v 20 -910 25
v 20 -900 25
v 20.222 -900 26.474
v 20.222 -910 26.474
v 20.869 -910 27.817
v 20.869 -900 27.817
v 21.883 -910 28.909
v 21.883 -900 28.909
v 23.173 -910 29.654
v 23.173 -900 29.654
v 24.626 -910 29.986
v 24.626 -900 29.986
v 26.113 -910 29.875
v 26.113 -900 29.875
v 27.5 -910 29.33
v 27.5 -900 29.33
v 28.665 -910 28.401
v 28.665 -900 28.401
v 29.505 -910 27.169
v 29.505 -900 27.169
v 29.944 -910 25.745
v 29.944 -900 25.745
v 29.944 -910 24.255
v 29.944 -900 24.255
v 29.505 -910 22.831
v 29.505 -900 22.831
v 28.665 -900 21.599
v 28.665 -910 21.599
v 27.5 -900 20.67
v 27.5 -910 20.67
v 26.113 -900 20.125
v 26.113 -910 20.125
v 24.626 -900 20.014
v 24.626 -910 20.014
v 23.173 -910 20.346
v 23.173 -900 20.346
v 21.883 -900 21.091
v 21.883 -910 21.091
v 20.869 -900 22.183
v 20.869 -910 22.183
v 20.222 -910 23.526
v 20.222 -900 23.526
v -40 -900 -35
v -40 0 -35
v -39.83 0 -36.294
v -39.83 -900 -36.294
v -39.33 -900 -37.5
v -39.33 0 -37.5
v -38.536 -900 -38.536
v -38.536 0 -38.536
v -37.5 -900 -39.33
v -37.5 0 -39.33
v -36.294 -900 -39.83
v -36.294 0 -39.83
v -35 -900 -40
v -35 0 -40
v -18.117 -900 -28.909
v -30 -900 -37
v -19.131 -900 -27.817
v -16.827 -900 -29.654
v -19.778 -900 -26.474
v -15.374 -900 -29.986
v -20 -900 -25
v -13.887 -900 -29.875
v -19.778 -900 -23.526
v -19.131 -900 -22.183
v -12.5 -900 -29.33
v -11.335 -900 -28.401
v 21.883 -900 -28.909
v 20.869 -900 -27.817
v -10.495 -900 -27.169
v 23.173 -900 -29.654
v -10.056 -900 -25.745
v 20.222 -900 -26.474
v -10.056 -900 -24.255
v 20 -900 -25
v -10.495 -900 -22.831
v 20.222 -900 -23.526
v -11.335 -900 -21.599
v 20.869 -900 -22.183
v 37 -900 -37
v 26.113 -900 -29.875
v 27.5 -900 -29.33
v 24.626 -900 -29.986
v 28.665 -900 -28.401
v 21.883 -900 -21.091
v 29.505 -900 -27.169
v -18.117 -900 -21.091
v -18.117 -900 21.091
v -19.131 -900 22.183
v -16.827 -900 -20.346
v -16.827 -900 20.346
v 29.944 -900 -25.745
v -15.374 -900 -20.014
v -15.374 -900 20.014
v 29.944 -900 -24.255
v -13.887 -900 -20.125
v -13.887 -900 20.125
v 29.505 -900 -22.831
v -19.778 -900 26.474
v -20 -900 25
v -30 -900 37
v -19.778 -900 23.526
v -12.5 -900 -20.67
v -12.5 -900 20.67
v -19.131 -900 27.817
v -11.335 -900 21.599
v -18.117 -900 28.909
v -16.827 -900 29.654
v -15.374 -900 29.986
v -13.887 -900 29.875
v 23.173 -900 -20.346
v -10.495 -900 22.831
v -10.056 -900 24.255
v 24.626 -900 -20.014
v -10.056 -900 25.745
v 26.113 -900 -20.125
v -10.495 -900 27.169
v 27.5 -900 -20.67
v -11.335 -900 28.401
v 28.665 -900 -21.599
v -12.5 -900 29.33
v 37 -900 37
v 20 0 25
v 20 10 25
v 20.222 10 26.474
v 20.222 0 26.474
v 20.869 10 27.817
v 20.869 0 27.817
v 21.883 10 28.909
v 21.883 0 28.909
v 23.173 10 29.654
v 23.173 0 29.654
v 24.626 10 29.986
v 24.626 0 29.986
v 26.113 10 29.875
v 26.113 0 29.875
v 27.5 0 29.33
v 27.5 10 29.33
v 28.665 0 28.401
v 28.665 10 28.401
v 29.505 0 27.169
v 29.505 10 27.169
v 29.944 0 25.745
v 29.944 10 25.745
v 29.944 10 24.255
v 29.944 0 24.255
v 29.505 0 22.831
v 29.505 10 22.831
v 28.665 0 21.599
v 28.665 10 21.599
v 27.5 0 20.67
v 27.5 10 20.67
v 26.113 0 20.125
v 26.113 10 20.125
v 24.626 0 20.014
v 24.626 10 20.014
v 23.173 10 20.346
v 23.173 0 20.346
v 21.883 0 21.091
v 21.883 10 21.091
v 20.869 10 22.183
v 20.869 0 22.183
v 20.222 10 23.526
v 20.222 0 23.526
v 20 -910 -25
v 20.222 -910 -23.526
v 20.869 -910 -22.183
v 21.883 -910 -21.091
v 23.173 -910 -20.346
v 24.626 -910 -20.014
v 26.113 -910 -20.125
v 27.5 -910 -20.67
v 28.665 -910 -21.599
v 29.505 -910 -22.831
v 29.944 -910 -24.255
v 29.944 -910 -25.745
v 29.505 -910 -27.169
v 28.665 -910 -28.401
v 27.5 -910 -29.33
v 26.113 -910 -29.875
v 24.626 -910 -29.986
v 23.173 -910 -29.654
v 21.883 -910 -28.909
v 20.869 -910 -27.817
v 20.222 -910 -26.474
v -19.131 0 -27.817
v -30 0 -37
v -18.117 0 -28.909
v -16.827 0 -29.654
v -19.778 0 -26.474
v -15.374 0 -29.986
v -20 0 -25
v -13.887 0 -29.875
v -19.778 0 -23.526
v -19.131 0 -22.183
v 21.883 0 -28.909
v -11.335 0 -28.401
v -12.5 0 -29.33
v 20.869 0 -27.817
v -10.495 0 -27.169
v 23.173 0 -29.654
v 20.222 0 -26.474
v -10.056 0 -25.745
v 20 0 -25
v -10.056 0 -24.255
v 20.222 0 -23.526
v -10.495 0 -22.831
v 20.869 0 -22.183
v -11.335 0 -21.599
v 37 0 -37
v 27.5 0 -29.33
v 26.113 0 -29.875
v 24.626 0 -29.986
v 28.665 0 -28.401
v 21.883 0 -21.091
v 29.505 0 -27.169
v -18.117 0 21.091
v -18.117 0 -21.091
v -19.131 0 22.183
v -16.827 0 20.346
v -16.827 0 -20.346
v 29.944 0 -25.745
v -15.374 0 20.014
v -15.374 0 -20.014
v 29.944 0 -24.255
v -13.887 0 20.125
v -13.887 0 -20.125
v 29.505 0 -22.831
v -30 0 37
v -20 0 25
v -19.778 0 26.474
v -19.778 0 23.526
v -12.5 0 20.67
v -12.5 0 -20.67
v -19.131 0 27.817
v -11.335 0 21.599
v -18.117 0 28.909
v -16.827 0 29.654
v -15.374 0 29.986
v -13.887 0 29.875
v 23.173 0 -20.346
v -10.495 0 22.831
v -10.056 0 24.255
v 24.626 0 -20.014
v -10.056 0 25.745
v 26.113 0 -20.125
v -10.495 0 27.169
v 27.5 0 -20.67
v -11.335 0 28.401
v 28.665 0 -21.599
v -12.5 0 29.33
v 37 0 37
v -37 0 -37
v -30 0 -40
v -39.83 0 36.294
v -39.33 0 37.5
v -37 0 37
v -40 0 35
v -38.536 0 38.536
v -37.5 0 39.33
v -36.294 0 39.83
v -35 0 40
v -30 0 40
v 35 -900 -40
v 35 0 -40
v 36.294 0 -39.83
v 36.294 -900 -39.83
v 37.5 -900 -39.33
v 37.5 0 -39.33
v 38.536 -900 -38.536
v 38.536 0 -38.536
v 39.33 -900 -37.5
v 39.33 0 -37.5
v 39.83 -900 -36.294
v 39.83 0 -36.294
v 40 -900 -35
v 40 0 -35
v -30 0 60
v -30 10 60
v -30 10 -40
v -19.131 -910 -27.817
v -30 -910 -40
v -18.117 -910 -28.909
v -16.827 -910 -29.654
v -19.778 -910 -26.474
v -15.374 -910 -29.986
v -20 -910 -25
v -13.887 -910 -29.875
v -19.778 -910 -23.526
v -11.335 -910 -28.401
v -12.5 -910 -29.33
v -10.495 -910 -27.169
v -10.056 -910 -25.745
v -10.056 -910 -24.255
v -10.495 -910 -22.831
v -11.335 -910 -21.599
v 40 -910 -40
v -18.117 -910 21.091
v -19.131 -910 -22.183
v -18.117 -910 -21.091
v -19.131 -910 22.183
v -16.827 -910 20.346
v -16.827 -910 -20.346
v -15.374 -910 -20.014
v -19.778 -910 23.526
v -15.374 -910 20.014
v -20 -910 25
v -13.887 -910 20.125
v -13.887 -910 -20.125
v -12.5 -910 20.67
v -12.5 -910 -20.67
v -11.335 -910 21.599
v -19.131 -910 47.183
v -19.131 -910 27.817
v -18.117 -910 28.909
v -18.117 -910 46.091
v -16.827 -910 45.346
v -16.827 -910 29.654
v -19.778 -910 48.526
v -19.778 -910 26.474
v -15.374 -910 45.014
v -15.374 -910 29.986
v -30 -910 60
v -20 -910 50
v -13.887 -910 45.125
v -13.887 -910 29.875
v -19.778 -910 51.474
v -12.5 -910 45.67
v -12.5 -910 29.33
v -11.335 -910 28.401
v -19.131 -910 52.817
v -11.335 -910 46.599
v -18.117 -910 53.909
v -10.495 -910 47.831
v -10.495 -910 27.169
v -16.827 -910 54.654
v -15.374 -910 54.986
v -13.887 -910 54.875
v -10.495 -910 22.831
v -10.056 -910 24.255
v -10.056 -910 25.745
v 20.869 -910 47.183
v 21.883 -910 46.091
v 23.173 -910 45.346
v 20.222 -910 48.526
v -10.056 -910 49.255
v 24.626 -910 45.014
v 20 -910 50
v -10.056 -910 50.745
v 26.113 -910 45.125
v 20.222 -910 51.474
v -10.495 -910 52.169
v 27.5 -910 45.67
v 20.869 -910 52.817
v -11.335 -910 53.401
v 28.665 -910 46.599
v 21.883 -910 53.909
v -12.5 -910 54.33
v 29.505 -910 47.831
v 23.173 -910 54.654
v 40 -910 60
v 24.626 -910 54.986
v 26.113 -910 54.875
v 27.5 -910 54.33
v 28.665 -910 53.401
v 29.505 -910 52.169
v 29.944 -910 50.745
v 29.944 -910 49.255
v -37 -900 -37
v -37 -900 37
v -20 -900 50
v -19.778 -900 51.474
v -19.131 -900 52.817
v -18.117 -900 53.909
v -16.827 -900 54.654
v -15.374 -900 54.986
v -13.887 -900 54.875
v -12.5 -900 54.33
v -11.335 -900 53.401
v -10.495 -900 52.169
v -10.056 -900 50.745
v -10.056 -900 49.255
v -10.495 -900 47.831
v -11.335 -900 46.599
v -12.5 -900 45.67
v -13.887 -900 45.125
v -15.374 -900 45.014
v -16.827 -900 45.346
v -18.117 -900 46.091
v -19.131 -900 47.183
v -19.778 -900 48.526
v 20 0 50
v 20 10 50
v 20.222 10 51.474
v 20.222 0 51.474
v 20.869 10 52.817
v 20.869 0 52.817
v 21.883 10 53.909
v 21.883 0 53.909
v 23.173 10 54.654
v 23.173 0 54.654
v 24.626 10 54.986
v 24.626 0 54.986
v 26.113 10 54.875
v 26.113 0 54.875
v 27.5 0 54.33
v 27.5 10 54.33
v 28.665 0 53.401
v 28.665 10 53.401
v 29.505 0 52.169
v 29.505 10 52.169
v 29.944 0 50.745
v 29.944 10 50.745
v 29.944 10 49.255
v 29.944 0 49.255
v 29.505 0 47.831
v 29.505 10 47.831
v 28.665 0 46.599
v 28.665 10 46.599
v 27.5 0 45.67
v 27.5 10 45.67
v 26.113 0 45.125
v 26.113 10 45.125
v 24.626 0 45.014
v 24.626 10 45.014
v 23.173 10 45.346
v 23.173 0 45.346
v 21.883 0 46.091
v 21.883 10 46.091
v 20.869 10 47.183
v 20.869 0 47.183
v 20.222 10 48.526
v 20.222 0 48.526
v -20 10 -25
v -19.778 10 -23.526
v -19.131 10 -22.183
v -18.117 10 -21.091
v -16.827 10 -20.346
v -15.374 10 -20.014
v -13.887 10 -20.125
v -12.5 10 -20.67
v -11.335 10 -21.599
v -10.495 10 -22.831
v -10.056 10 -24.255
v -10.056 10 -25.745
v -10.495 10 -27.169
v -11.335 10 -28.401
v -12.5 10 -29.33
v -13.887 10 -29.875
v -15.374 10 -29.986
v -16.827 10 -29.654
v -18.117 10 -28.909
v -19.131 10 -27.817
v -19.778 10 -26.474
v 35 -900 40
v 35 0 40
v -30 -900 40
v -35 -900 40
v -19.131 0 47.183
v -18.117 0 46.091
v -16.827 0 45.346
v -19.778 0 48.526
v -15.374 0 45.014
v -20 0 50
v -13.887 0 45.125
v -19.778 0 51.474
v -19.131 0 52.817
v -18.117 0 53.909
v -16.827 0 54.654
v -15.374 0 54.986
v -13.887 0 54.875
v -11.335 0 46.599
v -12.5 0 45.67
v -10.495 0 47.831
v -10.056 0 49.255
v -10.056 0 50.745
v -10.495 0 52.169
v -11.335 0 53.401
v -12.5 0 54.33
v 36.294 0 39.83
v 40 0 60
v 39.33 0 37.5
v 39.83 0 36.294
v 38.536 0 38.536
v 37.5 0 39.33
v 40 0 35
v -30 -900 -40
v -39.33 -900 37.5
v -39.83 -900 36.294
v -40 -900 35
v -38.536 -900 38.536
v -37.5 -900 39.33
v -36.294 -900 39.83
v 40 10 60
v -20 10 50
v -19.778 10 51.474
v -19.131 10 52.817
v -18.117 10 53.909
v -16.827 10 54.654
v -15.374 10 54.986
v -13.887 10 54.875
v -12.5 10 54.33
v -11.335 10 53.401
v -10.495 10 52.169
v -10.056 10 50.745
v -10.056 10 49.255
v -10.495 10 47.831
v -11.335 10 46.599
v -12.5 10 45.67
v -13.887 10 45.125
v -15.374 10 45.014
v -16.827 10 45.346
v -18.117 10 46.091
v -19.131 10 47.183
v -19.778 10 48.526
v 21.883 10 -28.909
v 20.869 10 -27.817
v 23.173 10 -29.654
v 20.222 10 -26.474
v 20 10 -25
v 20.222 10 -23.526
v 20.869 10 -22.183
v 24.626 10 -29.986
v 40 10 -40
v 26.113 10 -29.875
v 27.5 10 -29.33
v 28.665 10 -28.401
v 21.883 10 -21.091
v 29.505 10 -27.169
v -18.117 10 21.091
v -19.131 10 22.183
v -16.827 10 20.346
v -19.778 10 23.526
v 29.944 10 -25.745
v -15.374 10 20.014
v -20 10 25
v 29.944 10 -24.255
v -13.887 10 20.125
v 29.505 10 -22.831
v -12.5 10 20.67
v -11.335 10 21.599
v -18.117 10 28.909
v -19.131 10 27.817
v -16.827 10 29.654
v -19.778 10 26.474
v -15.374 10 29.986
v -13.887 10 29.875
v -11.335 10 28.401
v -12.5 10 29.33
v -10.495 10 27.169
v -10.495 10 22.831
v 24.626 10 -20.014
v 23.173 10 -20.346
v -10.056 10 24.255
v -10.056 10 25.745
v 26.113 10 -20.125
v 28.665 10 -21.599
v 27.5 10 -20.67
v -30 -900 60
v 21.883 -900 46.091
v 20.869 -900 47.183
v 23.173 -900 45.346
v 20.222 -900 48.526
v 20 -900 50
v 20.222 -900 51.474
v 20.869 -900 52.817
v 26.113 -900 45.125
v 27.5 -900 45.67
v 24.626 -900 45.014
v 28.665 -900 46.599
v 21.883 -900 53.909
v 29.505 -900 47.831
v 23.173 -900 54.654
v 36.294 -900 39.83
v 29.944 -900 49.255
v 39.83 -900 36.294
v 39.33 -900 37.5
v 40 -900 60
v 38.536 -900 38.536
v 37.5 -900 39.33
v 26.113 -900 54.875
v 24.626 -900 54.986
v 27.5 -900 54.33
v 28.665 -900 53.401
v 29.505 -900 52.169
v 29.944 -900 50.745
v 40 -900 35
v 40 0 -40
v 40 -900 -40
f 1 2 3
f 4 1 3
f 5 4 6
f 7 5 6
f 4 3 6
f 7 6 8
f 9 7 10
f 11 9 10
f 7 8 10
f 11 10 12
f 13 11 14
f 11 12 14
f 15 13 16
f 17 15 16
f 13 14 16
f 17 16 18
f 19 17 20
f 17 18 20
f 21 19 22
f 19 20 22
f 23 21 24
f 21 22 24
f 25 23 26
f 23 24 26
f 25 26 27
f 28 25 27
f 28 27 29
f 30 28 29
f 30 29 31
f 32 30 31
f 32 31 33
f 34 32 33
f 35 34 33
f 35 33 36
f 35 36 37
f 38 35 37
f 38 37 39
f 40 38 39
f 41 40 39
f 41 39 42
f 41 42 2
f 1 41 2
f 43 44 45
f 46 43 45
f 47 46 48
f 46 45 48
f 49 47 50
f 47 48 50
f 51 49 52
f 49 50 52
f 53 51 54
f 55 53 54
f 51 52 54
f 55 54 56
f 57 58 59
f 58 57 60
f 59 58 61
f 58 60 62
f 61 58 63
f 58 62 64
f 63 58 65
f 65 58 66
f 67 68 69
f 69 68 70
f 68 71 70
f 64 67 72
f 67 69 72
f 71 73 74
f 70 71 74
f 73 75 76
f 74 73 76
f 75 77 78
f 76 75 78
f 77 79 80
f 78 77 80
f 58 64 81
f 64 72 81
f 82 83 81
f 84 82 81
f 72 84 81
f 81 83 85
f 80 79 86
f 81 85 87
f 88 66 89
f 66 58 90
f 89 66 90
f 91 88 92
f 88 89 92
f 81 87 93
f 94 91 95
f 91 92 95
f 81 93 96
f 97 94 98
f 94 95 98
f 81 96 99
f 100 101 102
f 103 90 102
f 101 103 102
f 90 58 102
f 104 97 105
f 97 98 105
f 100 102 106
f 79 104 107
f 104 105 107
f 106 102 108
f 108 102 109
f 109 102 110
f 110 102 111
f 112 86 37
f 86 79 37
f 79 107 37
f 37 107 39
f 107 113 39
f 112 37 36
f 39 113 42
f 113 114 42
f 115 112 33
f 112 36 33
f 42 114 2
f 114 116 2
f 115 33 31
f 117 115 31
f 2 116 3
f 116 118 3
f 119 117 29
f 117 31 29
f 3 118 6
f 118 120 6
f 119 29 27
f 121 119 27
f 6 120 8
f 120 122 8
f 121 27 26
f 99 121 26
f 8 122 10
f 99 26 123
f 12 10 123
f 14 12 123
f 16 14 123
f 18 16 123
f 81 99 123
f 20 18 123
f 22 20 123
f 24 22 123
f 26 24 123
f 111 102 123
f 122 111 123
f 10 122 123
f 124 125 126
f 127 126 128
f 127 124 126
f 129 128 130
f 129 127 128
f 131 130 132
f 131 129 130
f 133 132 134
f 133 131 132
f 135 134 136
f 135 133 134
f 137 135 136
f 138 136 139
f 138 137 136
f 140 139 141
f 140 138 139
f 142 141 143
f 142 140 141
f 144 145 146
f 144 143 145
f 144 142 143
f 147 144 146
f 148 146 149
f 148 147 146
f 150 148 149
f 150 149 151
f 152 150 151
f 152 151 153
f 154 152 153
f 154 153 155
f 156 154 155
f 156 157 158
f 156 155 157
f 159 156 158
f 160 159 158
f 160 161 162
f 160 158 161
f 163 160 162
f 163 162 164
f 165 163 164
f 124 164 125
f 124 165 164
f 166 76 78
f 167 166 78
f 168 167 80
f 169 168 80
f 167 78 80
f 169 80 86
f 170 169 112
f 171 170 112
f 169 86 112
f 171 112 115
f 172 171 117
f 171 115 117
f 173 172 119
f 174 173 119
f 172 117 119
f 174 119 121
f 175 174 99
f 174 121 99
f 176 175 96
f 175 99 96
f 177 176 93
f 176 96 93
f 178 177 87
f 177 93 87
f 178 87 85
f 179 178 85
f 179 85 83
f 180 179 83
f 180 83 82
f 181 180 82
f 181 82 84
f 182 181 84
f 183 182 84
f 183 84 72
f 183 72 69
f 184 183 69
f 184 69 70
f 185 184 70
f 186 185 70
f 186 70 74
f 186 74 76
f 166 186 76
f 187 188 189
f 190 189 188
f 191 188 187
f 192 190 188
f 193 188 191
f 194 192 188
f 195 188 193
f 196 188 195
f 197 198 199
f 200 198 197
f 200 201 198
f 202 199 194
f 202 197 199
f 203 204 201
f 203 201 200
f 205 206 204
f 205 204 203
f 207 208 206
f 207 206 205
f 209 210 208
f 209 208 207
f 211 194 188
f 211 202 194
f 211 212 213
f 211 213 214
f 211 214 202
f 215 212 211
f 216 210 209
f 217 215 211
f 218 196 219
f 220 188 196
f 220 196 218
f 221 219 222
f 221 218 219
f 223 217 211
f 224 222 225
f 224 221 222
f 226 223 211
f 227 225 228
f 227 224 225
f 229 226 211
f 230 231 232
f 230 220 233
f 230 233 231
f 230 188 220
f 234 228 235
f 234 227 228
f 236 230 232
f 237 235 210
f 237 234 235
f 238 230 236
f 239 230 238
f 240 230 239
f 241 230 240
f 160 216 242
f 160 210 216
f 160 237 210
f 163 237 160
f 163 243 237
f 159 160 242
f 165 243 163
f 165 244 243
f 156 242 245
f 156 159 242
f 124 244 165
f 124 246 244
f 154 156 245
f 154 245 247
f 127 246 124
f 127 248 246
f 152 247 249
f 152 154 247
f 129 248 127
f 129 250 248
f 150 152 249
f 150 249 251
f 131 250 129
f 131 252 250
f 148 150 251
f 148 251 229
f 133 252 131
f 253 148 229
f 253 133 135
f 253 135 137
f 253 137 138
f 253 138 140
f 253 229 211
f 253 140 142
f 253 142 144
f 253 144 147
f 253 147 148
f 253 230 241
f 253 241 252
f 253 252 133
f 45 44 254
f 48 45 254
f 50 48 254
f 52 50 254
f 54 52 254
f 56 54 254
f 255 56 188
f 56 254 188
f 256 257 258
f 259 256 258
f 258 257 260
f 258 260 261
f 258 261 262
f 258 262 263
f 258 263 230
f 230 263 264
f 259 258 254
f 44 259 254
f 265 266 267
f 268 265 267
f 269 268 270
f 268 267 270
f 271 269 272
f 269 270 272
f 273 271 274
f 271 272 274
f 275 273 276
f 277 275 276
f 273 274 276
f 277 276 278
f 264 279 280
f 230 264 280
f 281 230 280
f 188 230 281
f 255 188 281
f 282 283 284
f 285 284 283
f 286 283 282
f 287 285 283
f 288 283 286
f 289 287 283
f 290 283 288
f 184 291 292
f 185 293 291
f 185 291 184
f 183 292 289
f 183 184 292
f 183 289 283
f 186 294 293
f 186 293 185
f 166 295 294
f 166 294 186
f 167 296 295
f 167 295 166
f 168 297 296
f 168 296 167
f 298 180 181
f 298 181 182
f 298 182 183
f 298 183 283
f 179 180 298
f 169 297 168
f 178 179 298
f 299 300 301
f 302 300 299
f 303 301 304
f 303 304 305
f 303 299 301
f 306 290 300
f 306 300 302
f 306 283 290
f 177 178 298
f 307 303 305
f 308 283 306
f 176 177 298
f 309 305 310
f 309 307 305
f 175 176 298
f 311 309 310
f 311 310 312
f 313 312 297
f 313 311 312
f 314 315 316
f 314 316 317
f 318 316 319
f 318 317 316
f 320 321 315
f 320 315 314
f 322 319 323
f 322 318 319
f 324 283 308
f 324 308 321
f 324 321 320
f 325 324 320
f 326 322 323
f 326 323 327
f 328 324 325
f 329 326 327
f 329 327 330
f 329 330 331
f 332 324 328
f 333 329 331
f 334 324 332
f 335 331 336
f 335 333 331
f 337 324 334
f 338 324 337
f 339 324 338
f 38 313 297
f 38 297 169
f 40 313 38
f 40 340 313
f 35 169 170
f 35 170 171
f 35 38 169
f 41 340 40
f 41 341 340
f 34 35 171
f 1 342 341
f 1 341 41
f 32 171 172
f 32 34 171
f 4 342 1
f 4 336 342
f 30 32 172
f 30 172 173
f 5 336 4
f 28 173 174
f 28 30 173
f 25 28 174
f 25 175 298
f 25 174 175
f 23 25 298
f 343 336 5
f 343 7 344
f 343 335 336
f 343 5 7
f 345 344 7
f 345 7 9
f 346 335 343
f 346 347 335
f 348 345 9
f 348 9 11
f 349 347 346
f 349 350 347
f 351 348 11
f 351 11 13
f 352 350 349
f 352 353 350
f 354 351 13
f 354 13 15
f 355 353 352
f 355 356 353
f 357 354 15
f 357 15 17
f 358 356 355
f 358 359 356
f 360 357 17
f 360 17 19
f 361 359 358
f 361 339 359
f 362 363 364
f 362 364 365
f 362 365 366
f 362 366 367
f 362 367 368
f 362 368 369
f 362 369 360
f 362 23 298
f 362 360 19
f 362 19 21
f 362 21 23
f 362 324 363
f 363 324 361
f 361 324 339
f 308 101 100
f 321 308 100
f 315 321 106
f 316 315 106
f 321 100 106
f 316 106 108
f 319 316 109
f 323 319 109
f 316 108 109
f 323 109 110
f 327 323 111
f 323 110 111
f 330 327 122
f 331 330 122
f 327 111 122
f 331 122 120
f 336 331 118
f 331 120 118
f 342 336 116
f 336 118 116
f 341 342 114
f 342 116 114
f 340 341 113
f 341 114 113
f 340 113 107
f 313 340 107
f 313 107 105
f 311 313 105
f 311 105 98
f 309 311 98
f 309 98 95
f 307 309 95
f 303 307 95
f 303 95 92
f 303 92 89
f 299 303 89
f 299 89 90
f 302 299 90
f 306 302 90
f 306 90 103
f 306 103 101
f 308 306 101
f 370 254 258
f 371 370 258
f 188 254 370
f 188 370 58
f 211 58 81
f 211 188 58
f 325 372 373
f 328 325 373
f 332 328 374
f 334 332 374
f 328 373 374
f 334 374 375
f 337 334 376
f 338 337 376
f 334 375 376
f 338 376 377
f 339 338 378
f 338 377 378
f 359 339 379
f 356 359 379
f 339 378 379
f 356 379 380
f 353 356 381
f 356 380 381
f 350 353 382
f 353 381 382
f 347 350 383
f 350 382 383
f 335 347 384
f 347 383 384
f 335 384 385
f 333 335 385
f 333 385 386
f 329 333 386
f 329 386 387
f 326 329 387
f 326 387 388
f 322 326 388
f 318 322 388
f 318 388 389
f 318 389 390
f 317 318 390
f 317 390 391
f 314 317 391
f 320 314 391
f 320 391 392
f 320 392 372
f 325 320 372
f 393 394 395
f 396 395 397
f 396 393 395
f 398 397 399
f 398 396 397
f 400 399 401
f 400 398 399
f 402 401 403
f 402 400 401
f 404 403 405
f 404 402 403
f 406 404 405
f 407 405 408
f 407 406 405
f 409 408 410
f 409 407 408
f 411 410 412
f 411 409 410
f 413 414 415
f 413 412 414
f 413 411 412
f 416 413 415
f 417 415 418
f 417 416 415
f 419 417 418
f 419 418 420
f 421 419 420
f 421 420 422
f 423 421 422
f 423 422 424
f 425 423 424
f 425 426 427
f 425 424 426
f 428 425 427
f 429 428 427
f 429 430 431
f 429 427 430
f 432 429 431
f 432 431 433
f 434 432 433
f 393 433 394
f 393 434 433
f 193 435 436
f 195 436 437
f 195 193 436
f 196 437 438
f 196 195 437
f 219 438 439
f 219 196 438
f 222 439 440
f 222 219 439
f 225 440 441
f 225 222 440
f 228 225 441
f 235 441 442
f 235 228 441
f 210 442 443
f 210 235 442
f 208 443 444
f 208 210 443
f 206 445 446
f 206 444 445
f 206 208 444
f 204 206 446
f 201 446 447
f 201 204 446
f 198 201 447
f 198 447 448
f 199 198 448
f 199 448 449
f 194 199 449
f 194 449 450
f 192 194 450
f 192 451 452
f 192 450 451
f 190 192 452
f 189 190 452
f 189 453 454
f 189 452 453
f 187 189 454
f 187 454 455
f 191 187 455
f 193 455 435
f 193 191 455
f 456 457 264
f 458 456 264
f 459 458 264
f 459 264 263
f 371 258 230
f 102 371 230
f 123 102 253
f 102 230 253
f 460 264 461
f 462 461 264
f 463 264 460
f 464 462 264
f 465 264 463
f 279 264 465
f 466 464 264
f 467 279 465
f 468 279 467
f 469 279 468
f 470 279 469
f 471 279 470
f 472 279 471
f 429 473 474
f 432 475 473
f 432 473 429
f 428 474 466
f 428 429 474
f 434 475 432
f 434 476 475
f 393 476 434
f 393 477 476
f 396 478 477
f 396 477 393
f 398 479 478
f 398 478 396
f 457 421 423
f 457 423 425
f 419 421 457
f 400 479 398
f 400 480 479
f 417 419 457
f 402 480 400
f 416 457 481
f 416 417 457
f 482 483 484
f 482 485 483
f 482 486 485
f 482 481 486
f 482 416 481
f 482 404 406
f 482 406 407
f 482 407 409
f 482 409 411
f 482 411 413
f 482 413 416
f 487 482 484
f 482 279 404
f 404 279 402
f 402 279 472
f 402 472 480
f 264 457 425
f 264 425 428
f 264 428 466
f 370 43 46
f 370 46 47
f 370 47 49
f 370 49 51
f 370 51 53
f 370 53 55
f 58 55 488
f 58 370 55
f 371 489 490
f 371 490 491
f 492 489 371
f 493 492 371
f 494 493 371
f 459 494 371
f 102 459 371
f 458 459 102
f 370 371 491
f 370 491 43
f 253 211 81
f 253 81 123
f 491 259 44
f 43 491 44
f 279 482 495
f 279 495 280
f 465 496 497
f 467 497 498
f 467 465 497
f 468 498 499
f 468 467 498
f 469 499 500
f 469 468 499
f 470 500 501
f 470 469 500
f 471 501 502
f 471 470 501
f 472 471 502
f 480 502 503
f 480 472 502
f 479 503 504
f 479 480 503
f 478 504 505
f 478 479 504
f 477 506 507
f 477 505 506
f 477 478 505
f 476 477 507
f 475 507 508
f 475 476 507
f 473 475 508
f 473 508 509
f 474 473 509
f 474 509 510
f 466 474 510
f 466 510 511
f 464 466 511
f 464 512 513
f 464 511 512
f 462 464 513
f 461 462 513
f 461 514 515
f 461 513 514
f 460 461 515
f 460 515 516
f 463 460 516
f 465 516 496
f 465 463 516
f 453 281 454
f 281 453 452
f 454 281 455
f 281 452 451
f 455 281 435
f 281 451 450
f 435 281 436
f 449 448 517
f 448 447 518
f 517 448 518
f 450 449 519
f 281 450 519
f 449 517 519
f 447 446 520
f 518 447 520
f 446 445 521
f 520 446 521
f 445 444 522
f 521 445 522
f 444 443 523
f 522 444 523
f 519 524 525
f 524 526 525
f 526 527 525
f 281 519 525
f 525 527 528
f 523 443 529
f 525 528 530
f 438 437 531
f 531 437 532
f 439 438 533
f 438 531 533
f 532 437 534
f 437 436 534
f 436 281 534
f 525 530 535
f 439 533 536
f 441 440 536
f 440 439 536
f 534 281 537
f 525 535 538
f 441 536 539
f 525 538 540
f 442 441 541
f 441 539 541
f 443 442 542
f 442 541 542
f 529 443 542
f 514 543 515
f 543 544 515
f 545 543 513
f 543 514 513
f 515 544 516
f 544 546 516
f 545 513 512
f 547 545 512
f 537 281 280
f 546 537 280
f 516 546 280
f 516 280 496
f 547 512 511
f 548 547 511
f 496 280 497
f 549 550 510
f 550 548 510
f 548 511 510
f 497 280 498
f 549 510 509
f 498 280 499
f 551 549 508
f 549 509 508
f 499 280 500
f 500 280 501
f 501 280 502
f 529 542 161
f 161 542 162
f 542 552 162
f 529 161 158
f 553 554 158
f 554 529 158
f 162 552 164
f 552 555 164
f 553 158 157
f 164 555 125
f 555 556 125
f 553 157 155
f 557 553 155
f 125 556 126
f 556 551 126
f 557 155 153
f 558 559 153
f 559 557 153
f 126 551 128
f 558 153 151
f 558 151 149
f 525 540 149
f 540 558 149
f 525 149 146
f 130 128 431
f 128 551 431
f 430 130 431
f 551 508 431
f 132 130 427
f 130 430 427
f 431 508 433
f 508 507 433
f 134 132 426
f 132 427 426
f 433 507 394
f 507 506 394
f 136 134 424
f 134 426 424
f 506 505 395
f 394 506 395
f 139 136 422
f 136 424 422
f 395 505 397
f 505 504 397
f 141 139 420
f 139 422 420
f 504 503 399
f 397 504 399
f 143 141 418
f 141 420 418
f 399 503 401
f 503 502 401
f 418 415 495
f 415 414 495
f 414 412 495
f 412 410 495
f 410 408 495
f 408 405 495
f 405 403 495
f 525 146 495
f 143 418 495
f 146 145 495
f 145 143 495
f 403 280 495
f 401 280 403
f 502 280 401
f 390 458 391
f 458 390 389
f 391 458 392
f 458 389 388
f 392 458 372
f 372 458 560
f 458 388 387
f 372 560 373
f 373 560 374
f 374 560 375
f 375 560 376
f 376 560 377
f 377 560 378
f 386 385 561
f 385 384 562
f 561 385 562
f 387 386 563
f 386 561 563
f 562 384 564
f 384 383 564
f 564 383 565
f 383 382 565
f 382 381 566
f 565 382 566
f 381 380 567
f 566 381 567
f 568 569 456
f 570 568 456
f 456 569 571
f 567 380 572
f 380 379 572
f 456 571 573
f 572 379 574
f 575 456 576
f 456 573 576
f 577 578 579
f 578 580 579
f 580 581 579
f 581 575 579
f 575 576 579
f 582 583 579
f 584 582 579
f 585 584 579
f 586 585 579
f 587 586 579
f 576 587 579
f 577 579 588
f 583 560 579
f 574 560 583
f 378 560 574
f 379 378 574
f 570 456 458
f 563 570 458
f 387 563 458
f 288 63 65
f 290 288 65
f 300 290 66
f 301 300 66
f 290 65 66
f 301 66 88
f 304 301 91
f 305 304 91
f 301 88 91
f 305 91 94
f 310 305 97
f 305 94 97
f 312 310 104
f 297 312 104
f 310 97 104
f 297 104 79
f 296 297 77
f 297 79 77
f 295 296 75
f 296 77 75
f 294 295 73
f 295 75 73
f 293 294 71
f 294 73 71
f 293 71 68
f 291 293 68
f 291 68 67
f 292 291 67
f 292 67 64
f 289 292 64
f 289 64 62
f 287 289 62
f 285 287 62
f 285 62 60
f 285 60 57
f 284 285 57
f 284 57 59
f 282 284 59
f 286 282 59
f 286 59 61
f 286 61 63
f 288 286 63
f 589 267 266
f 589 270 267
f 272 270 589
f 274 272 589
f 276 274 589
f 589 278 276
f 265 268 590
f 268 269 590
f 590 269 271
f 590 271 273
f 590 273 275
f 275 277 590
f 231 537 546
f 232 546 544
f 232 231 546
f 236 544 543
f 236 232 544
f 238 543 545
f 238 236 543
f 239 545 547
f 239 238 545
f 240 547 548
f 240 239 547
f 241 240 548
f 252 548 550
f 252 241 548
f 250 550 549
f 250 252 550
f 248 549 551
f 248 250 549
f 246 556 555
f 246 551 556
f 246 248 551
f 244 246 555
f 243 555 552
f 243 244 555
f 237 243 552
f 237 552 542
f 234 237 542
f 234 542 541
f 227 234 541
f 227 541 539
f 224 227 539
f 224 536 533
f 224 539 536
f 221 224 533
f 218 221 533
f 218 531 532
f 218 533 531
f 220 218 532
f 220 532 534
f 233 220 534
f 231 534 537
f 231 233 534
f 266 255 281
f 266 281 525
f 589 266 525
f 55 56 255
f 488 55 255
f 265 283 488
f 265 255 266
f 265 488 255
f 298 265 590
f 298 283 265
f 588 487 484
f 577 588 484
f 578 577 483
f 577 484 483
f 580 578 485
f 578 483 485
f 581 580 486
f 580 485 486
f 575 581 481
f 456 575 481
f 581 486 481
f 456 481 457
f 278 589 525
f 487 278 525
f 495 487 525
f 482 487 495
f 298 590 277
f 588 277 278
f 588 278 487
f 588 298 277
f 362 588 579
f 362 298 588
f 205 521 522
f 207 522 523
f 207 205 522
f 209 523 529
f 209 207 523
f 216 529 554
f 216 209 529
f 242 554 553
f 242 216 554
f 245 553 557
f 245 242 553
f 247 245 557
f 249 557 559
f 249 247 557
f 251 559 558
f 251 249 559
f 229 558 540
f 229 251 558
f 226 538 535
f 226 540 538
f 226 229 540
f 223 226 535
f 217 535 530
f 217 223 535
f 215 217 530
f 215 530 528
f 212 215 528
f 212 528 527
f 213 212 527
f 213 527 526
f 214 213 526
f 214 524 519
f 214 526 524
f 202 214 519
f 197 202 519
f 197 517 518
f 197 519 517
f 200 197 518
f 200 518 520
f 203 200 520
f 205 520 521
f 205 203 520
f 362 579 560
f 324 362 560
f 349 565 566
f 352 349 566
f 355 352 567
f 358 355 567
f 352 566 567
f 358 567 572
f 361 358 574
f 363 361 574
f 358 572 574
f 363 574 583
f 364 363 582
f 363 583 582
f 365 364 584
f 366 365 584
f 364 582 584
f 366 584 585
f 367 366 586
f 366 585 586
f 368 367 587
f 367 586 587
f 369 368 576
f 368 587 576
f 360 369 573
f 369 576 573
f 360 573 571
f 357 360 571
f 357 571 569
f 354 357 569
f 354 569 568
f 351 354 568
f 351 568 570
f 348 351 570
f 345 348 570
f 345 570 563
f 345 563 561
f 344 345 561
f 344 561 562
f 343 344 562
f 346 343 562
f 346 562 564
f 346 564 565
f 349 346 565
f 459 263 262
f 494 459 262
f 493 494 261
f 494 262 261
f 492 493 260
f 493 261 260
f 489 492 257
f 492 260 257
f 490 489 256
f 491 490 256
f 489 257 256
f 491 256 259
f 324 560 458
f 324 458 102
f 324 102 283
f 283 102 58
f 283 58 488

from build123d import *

# Parameters (mm, degrees)
F0_W     = 74
F0_H     = 74
F1_DEPTH = 900
F2_W     = 67
F2_H     = 74
F3_DEPTH = 10
F4_R     = 5
F5_DEPTH = 25


# Not quite as in the source:
# - a pattern or mirror of a feature is missing from the dataset's text; its kind, count and spacing are read off the source's solid


with BuildPart() as f1:
    # F0 (on Front) → F1 (new body)
    with BuildSketch(Plane.XZ):
        with BuildLine():
            ThreePointArc((40, 35), (38.5355339059, 38.5355339059), (35, 40))
            Line((35, 40), (-35, 40))
            ThreePointArc((-35, 40), (-38.5355339059, 38.5355339059), (-40, 35))
            Line((-40, 35), (-40, -35))
            ThreePointArc((-40, -35), (-38.5355339059, -38.5355339059), (-35, -40))
            Line((-35, -40), (35, -40))
            ThreePointArc((35, -40), (38.5355339059, -38.5355339059), (40, -35))
            Line((40, -35), (40, 35))
        make_face()
        Rectangle(F0_W, F0_H, mode=Mode.SUBTRACT)
    extrude(amount=F1_DEPTH)

    # F2 (on face) → F3 (join)
    with BuildSketch(Plane.XZ.offset(900)):
        with Locations((3.5, 0)):
            Rectangle(F2_W, F2_H)
        with BuildLine():
            Line((-30, -37), (-30, -40))
            Line((-30, -40), (35, -40))
            ThreePointArc((35, -40), (38.5355339059, -38.5355339059), (40, -35))
            Line((40, -35), (40, 35))
            ThreePointArc((40, 35), (38.5355339059, 38.5355339059), (35, 40))
            Line((35, 40), (-30, 40))
            Line((-30, 40), (-30, 37))
            Line((-30, 37), (37, 37))
            Line((37, 37), (37, -37))
            Line((37, -37), (-30, -37))
        make_face()
        with BuildLine():
            ThreePointArc((40, -35), (38.5355339059, -38.5355339059), (35, -40))
            Line((35, -40), (40, -40))
            Line((40, -40), (40, -35))
        make_face()
        with BuildLine():
            ThreePointArc((35, 40), (38.5355339059, 38.5355339059), (40, 35))
            Line((40, 35), (40, 60))
            Line((40, 60), (-30, 60))
            Line((-30, 60), (-30, 40))
            Line((-30, 40), (35, 40))
        make_face()
    f3 = extrude(amount=F3_DEPTH)

    # F3_copies: F3 across plane
    add(f3.mirror(Plane.ZX.offset(-450)))

    # F4 (on face) → F5 (cut)
    with BuildSketch(Plane(origin=(0, -900, 0), x_dir=(-1, 0, 0), z_dir=(0, 1, 0))):
        with Locations((-25, 50)):
            Circle(F4_R)
        with Locations((15, 50)):
            Circle(F4_R)
        with Locations((15, 25)):
            Circle(F4_R)
        with Locations((-25, 25)):
            Circle(F4_R)
        with Locations((-25, -25)):
            Circle(F4_R)
        with Locations((15, -25)):
            Circle(F4_R)
    f5 = extrude(amount=-F5_DEPTH, mode=Mode.SUBTRACT)

    # F5_copies: F5 across plane
    add(f5.mirror(Plane.ZX.offset(-450)), mode=Mode.SUBTRACT)


solid = f1.part
